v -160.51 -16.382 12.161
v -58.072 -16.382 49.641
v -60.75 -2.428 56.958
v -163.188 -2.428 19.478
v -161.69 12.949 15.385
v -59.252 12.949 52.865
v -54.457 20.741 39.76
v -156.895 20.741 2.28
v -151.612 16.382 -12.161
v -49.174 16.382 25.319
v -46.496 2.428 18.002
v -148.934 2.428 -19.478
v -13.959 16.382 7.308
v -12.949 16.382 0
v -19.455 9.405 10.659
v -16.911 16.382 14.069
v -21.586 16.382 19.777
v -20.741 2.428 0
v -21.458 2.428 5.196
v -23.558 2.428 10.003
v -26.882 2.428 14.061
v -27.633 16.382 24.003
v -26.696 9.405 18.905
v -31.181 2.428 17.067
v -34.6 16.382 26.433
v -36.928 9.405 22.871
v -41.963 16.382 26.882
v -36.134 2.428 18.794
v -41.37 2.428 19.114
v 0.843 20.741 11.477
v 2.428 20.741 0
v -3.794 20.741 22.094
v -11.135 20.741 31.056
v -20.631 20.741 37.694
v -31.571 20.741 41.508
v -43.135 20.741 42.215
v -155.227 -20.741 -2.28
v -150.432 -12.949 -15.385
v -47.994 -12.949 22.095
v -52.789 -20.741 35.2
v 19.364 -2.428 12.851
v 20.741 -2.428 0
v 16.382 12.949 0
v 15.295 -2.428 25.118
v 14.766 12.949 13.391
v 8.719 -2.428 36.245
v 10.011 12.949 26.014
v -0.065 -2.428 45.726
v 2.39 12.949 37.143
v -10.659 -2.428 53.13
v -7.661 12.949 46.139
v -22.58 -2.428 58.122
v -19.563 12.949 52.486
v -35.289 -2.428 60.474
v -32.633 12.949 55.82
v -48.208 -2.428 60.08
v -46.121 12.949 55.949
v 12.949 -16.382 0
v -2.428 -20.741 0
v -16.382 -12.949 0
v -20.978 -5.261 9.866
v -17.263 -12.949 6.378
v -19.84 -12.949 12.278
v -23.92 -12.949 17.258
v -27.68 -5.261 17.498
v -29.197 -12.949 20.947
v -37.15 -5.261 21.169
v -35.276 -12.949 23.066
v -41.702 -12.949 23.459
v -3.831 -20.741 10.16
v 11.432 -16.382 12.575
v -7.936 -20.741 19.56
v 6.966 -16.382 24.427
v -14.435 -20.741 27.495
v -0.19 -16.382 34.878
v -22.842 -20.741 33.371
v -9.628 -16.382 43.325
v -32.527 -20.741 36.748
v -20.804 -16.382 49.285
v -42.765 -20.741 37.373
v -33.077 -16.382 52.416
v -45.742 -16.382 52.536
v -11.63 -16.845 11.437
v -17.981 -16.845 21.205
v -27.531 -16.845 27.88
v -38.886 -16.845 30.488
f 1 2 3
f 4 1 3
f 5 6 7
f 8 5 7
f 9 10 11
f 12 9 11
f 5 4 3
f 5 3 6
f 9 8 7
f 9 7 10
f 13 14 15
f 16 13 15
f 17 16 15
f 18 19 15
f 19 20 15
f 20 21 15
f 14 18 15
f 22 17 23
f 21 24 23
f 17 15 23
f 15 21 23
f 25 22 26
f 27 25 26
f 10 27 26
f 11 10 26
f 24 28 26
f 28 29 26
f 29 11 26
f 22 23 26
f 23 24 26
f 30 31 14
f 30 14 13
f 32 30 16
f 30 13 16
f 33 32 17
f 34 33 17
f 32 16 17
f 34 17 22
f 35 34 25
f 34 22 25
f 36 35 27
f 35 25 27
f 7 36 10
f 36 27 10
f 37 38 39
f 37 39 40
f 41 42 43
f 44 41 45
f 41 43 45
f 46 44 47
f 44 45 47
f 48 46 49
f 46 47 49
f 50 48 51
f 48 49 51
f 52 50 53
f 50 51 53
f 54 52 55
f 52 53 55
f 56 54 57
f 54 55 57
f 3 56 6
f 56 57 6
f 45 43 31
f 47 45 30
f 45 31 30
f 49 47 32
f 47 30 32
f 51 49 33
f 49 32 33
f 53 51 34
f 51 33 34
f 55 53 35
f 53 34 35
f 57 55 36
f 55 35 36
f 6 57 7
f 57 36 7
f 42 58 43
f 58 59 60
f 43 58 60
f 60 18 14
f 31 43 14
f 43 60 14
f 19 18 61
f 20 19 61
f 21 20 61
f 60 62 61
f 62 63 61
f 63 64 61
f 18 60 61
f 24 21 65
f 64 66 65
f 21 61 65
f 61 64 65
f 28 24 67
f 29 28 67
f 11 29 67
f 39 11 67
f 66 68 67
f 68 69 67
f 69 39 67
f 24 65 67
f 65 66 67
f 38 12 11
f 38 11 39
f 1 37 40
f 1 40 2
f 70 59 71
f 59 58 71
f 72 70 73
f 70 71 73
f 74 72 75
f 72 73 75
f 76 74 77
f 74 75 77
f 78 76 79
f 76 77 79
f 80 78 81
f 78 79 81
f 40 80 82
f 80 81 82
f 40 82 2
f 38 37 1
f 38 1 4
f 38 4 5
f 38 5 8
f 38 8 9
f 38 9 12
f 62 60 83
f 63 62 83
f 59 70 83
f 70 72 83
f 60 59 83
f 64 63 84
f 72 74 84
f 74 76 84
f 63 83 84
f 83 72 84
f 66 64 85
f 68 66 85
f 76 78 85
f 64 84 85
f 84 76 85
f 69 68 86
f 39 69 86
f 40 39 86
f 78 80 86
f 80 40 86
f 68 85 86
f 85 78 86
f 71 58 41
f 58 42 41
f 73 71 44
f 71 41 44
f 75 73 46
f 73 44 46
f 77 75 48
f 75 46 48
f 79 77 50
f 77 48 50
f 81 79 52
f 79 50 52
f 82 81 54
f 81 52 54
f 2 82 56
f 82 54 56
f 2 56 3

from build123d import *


with BuildPart() as f2:
    # F2: sweep along a path in F1
    with BuildLine(Plane.XZ) as f2_path:
        ThreePointArc((0, 0), (-17.046052, 32.711514), (-53.622998, 37.479948))
        Line((-53.622998, 37.479948), (-156.060986, 0))
    # F0 (on Top) → F2 (sweep)
    with BuildSketch(Plane.XY):
        Polygon((-12.949203, 16.38248), (-20.740632, 2.427694), (-16.38248, -12.949203), (-2.427694, -20.740632), (12.949203, -16.38248), (20.740632, -2.427694), (16.38248, 12.949203), (2.427694, 20.740632), align=None)
    sweep(path=f2_path.line)


solid = f2.part
